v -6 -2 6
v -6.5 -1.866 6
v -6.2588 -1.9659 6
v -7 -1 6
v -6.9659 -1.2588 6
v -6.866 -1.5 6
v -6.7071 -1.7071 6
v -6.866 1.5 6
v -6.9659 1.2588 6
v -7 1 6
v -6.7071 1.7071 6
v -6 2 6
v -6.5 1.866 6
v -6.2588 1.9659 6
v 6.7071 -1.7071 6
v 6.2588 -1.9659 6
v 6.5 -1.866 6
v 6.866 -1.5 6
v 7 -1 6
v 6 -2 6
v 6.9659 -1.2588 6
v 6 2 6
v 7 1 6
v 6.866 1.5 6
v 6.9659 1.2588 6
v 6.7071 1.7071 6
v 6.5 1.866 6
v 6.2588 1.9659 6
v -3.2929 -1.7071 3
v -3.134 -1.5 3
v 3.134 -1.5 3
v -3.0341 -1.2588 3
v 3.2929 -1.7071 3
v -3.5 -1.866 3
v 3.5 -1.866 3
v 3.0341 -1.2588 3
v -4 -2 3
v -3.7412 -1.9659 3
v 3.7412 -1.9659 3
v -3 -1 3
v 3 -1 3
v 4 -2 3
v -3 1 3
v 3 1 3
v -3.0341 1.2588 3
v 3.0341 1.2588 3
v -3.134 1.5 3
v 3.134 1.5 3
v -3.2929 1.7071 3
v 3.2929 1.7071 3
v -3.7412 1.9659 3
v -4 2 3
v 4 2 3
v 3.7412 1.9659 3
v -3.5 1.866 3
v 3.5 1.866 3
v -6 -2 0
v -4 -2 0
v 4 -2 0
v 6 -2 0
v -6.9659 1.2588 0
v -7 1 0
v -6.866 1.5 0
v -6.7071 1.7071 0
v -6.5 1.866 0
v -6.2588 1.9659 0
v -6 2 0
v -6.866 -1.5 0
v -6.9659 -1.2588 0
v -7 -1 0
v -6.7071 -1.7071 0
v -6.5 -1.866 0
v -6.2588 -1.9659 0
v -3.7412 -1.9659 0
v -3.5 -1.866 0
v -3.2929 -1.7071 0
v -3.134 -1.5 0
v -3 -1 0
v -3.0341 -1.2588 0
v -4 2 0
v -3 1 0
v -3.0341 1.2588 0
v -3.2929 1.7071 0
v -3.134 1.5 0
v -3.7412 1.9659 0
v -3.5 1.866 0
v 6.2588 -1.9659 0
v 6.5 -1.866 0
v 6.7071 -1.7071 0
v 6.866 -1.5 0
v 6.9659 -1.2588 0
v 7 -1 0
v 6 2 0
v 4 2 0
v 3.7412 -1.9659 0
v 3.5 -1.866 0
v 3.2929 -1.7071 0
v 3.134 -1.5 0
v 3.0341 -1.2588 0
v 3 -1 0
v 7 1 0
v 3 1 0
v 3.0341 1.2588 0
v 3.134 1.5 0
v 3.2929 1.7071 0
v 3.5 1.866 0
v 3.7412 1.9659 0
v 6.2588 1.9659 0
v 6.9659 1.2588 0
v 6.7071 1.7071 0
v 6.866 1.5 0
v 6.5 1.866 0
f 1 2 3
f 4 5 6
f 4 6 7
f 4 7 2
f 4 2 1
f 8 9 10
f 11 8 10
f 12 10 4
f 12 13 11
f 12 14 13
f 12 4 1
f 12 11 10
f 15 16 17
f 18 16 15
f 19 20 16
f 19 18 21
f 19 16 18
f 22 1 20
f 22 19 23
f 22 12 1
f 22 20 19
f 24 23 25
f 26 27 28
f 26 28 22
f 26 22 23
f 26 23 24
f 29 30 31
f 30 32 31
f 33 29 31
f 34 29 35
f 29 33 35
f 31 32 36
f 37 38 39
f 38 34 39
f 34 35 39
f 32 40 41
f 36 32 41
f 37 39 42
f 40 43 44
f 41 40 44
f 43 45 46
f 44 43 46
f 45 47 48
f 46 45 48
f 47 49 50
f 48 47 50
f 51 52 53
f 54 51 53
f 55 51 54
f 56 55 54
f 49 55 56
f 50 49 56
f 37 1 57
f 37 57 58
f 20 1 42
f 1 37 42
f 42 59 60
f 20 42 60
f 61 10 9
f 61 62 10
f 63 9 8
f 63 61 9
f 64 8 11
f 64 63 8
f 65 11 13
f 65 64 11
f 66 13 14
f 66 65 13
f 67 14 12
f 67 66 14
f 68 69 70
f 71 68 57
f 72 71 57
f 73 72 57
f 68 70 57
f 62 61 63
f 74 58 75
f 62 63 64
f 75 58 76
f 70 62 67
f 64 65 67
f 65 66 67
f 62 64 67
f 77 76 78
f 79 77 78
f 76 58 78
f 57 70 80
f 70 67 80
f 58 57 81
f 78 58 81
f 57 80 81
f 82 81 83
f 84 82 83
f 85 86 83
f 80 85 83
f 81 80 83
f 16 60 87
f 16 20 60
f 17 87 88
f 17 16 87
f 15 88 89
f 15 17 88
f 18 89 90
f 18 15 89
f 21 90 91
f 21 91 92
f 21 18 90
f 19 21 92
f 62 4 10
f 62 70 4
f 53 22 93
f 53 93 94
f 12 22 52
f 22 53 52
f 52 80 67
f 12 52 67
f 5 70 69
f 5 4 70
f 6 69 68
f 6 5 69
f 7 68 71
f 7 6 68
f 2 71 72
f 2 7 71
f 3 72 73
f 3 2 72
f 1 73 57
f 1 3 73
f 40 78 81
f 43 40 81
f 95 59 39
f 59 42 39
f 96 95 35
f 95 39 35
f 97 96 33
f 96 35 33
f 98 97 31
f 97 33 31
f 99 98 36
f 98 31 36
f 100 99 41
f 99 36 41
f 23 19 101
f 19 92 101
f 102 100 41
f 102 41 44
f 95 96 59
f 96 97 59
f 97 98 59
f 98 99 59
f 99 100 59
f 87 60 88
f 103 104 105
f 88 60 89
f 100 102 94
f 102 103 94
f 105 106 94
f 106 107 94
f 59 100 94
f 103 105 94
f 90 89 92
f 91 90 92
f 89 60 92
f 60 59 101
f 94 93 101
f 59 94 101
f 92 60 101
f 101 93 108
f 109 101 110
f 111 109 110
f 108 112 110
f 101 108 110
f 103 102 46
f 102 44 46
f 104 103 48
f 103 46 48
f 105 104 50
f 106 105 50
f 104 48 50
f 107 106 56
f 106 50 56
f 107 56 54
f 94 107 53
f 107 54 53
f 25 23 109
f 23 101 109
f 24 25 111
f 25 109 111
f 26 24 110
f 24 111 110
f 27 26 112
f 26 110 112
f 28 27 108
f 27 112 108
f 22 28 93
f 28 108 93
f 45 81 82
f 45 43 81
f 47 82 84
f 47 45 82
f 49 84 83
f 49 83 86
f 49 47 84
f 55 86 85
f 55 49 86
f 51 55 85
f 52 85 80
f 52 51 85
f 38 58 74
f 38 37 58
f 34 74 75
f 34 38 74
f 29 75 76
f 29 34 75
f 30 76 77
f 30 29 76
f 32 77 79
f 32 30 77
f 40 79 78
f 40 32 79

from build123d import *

# Parameters (mm, degrees)
F0_W     = 4
F0_H     = 4
F1_DEPTH = 3
F2_W     = 4
F2_H     = 4
F2_W_2   = 10
F3_DEPTH = 3
F4_R     = 1


with BuildPart() as f1:
    # F0 (on Top) → F1 (new body)
    with BuildSketch(Plane.XY):
        with Locations((-5, 0)):
            Rectangle(F0_W, F0_H)
        with Locations((5, 0)):
            Rectangle(F0_W, F0_H)
    extrude(amount=F1_DEPTH)

    # F2 (on face) → F3 (join)
    with BuildSketch(Plane.XY.offset(3)):
        with Locations((-5, 0)):
            Rectangle(F2_W, F2_H)
        with Locations((2, 0)):
            Rectangle(F2_W_2, F2_H)
    extrude(amount=F3_DEPTH)

    # F4
    f4_edges = [f1.edges().sort_by_distance(p)[0] for p in [
        (-7, -2, 3),
        (-3, -2, 1.5),
        (-3, 2, 1.5),
        (3, -2, 1.5),
        (7, -2, 3),
        (7, 2, 3),
        (3, 2, 1.5),
        (-7, 2, 3),
    ]]
    fillet(f4_edges, radius=F4_R)


solid = f1.part
